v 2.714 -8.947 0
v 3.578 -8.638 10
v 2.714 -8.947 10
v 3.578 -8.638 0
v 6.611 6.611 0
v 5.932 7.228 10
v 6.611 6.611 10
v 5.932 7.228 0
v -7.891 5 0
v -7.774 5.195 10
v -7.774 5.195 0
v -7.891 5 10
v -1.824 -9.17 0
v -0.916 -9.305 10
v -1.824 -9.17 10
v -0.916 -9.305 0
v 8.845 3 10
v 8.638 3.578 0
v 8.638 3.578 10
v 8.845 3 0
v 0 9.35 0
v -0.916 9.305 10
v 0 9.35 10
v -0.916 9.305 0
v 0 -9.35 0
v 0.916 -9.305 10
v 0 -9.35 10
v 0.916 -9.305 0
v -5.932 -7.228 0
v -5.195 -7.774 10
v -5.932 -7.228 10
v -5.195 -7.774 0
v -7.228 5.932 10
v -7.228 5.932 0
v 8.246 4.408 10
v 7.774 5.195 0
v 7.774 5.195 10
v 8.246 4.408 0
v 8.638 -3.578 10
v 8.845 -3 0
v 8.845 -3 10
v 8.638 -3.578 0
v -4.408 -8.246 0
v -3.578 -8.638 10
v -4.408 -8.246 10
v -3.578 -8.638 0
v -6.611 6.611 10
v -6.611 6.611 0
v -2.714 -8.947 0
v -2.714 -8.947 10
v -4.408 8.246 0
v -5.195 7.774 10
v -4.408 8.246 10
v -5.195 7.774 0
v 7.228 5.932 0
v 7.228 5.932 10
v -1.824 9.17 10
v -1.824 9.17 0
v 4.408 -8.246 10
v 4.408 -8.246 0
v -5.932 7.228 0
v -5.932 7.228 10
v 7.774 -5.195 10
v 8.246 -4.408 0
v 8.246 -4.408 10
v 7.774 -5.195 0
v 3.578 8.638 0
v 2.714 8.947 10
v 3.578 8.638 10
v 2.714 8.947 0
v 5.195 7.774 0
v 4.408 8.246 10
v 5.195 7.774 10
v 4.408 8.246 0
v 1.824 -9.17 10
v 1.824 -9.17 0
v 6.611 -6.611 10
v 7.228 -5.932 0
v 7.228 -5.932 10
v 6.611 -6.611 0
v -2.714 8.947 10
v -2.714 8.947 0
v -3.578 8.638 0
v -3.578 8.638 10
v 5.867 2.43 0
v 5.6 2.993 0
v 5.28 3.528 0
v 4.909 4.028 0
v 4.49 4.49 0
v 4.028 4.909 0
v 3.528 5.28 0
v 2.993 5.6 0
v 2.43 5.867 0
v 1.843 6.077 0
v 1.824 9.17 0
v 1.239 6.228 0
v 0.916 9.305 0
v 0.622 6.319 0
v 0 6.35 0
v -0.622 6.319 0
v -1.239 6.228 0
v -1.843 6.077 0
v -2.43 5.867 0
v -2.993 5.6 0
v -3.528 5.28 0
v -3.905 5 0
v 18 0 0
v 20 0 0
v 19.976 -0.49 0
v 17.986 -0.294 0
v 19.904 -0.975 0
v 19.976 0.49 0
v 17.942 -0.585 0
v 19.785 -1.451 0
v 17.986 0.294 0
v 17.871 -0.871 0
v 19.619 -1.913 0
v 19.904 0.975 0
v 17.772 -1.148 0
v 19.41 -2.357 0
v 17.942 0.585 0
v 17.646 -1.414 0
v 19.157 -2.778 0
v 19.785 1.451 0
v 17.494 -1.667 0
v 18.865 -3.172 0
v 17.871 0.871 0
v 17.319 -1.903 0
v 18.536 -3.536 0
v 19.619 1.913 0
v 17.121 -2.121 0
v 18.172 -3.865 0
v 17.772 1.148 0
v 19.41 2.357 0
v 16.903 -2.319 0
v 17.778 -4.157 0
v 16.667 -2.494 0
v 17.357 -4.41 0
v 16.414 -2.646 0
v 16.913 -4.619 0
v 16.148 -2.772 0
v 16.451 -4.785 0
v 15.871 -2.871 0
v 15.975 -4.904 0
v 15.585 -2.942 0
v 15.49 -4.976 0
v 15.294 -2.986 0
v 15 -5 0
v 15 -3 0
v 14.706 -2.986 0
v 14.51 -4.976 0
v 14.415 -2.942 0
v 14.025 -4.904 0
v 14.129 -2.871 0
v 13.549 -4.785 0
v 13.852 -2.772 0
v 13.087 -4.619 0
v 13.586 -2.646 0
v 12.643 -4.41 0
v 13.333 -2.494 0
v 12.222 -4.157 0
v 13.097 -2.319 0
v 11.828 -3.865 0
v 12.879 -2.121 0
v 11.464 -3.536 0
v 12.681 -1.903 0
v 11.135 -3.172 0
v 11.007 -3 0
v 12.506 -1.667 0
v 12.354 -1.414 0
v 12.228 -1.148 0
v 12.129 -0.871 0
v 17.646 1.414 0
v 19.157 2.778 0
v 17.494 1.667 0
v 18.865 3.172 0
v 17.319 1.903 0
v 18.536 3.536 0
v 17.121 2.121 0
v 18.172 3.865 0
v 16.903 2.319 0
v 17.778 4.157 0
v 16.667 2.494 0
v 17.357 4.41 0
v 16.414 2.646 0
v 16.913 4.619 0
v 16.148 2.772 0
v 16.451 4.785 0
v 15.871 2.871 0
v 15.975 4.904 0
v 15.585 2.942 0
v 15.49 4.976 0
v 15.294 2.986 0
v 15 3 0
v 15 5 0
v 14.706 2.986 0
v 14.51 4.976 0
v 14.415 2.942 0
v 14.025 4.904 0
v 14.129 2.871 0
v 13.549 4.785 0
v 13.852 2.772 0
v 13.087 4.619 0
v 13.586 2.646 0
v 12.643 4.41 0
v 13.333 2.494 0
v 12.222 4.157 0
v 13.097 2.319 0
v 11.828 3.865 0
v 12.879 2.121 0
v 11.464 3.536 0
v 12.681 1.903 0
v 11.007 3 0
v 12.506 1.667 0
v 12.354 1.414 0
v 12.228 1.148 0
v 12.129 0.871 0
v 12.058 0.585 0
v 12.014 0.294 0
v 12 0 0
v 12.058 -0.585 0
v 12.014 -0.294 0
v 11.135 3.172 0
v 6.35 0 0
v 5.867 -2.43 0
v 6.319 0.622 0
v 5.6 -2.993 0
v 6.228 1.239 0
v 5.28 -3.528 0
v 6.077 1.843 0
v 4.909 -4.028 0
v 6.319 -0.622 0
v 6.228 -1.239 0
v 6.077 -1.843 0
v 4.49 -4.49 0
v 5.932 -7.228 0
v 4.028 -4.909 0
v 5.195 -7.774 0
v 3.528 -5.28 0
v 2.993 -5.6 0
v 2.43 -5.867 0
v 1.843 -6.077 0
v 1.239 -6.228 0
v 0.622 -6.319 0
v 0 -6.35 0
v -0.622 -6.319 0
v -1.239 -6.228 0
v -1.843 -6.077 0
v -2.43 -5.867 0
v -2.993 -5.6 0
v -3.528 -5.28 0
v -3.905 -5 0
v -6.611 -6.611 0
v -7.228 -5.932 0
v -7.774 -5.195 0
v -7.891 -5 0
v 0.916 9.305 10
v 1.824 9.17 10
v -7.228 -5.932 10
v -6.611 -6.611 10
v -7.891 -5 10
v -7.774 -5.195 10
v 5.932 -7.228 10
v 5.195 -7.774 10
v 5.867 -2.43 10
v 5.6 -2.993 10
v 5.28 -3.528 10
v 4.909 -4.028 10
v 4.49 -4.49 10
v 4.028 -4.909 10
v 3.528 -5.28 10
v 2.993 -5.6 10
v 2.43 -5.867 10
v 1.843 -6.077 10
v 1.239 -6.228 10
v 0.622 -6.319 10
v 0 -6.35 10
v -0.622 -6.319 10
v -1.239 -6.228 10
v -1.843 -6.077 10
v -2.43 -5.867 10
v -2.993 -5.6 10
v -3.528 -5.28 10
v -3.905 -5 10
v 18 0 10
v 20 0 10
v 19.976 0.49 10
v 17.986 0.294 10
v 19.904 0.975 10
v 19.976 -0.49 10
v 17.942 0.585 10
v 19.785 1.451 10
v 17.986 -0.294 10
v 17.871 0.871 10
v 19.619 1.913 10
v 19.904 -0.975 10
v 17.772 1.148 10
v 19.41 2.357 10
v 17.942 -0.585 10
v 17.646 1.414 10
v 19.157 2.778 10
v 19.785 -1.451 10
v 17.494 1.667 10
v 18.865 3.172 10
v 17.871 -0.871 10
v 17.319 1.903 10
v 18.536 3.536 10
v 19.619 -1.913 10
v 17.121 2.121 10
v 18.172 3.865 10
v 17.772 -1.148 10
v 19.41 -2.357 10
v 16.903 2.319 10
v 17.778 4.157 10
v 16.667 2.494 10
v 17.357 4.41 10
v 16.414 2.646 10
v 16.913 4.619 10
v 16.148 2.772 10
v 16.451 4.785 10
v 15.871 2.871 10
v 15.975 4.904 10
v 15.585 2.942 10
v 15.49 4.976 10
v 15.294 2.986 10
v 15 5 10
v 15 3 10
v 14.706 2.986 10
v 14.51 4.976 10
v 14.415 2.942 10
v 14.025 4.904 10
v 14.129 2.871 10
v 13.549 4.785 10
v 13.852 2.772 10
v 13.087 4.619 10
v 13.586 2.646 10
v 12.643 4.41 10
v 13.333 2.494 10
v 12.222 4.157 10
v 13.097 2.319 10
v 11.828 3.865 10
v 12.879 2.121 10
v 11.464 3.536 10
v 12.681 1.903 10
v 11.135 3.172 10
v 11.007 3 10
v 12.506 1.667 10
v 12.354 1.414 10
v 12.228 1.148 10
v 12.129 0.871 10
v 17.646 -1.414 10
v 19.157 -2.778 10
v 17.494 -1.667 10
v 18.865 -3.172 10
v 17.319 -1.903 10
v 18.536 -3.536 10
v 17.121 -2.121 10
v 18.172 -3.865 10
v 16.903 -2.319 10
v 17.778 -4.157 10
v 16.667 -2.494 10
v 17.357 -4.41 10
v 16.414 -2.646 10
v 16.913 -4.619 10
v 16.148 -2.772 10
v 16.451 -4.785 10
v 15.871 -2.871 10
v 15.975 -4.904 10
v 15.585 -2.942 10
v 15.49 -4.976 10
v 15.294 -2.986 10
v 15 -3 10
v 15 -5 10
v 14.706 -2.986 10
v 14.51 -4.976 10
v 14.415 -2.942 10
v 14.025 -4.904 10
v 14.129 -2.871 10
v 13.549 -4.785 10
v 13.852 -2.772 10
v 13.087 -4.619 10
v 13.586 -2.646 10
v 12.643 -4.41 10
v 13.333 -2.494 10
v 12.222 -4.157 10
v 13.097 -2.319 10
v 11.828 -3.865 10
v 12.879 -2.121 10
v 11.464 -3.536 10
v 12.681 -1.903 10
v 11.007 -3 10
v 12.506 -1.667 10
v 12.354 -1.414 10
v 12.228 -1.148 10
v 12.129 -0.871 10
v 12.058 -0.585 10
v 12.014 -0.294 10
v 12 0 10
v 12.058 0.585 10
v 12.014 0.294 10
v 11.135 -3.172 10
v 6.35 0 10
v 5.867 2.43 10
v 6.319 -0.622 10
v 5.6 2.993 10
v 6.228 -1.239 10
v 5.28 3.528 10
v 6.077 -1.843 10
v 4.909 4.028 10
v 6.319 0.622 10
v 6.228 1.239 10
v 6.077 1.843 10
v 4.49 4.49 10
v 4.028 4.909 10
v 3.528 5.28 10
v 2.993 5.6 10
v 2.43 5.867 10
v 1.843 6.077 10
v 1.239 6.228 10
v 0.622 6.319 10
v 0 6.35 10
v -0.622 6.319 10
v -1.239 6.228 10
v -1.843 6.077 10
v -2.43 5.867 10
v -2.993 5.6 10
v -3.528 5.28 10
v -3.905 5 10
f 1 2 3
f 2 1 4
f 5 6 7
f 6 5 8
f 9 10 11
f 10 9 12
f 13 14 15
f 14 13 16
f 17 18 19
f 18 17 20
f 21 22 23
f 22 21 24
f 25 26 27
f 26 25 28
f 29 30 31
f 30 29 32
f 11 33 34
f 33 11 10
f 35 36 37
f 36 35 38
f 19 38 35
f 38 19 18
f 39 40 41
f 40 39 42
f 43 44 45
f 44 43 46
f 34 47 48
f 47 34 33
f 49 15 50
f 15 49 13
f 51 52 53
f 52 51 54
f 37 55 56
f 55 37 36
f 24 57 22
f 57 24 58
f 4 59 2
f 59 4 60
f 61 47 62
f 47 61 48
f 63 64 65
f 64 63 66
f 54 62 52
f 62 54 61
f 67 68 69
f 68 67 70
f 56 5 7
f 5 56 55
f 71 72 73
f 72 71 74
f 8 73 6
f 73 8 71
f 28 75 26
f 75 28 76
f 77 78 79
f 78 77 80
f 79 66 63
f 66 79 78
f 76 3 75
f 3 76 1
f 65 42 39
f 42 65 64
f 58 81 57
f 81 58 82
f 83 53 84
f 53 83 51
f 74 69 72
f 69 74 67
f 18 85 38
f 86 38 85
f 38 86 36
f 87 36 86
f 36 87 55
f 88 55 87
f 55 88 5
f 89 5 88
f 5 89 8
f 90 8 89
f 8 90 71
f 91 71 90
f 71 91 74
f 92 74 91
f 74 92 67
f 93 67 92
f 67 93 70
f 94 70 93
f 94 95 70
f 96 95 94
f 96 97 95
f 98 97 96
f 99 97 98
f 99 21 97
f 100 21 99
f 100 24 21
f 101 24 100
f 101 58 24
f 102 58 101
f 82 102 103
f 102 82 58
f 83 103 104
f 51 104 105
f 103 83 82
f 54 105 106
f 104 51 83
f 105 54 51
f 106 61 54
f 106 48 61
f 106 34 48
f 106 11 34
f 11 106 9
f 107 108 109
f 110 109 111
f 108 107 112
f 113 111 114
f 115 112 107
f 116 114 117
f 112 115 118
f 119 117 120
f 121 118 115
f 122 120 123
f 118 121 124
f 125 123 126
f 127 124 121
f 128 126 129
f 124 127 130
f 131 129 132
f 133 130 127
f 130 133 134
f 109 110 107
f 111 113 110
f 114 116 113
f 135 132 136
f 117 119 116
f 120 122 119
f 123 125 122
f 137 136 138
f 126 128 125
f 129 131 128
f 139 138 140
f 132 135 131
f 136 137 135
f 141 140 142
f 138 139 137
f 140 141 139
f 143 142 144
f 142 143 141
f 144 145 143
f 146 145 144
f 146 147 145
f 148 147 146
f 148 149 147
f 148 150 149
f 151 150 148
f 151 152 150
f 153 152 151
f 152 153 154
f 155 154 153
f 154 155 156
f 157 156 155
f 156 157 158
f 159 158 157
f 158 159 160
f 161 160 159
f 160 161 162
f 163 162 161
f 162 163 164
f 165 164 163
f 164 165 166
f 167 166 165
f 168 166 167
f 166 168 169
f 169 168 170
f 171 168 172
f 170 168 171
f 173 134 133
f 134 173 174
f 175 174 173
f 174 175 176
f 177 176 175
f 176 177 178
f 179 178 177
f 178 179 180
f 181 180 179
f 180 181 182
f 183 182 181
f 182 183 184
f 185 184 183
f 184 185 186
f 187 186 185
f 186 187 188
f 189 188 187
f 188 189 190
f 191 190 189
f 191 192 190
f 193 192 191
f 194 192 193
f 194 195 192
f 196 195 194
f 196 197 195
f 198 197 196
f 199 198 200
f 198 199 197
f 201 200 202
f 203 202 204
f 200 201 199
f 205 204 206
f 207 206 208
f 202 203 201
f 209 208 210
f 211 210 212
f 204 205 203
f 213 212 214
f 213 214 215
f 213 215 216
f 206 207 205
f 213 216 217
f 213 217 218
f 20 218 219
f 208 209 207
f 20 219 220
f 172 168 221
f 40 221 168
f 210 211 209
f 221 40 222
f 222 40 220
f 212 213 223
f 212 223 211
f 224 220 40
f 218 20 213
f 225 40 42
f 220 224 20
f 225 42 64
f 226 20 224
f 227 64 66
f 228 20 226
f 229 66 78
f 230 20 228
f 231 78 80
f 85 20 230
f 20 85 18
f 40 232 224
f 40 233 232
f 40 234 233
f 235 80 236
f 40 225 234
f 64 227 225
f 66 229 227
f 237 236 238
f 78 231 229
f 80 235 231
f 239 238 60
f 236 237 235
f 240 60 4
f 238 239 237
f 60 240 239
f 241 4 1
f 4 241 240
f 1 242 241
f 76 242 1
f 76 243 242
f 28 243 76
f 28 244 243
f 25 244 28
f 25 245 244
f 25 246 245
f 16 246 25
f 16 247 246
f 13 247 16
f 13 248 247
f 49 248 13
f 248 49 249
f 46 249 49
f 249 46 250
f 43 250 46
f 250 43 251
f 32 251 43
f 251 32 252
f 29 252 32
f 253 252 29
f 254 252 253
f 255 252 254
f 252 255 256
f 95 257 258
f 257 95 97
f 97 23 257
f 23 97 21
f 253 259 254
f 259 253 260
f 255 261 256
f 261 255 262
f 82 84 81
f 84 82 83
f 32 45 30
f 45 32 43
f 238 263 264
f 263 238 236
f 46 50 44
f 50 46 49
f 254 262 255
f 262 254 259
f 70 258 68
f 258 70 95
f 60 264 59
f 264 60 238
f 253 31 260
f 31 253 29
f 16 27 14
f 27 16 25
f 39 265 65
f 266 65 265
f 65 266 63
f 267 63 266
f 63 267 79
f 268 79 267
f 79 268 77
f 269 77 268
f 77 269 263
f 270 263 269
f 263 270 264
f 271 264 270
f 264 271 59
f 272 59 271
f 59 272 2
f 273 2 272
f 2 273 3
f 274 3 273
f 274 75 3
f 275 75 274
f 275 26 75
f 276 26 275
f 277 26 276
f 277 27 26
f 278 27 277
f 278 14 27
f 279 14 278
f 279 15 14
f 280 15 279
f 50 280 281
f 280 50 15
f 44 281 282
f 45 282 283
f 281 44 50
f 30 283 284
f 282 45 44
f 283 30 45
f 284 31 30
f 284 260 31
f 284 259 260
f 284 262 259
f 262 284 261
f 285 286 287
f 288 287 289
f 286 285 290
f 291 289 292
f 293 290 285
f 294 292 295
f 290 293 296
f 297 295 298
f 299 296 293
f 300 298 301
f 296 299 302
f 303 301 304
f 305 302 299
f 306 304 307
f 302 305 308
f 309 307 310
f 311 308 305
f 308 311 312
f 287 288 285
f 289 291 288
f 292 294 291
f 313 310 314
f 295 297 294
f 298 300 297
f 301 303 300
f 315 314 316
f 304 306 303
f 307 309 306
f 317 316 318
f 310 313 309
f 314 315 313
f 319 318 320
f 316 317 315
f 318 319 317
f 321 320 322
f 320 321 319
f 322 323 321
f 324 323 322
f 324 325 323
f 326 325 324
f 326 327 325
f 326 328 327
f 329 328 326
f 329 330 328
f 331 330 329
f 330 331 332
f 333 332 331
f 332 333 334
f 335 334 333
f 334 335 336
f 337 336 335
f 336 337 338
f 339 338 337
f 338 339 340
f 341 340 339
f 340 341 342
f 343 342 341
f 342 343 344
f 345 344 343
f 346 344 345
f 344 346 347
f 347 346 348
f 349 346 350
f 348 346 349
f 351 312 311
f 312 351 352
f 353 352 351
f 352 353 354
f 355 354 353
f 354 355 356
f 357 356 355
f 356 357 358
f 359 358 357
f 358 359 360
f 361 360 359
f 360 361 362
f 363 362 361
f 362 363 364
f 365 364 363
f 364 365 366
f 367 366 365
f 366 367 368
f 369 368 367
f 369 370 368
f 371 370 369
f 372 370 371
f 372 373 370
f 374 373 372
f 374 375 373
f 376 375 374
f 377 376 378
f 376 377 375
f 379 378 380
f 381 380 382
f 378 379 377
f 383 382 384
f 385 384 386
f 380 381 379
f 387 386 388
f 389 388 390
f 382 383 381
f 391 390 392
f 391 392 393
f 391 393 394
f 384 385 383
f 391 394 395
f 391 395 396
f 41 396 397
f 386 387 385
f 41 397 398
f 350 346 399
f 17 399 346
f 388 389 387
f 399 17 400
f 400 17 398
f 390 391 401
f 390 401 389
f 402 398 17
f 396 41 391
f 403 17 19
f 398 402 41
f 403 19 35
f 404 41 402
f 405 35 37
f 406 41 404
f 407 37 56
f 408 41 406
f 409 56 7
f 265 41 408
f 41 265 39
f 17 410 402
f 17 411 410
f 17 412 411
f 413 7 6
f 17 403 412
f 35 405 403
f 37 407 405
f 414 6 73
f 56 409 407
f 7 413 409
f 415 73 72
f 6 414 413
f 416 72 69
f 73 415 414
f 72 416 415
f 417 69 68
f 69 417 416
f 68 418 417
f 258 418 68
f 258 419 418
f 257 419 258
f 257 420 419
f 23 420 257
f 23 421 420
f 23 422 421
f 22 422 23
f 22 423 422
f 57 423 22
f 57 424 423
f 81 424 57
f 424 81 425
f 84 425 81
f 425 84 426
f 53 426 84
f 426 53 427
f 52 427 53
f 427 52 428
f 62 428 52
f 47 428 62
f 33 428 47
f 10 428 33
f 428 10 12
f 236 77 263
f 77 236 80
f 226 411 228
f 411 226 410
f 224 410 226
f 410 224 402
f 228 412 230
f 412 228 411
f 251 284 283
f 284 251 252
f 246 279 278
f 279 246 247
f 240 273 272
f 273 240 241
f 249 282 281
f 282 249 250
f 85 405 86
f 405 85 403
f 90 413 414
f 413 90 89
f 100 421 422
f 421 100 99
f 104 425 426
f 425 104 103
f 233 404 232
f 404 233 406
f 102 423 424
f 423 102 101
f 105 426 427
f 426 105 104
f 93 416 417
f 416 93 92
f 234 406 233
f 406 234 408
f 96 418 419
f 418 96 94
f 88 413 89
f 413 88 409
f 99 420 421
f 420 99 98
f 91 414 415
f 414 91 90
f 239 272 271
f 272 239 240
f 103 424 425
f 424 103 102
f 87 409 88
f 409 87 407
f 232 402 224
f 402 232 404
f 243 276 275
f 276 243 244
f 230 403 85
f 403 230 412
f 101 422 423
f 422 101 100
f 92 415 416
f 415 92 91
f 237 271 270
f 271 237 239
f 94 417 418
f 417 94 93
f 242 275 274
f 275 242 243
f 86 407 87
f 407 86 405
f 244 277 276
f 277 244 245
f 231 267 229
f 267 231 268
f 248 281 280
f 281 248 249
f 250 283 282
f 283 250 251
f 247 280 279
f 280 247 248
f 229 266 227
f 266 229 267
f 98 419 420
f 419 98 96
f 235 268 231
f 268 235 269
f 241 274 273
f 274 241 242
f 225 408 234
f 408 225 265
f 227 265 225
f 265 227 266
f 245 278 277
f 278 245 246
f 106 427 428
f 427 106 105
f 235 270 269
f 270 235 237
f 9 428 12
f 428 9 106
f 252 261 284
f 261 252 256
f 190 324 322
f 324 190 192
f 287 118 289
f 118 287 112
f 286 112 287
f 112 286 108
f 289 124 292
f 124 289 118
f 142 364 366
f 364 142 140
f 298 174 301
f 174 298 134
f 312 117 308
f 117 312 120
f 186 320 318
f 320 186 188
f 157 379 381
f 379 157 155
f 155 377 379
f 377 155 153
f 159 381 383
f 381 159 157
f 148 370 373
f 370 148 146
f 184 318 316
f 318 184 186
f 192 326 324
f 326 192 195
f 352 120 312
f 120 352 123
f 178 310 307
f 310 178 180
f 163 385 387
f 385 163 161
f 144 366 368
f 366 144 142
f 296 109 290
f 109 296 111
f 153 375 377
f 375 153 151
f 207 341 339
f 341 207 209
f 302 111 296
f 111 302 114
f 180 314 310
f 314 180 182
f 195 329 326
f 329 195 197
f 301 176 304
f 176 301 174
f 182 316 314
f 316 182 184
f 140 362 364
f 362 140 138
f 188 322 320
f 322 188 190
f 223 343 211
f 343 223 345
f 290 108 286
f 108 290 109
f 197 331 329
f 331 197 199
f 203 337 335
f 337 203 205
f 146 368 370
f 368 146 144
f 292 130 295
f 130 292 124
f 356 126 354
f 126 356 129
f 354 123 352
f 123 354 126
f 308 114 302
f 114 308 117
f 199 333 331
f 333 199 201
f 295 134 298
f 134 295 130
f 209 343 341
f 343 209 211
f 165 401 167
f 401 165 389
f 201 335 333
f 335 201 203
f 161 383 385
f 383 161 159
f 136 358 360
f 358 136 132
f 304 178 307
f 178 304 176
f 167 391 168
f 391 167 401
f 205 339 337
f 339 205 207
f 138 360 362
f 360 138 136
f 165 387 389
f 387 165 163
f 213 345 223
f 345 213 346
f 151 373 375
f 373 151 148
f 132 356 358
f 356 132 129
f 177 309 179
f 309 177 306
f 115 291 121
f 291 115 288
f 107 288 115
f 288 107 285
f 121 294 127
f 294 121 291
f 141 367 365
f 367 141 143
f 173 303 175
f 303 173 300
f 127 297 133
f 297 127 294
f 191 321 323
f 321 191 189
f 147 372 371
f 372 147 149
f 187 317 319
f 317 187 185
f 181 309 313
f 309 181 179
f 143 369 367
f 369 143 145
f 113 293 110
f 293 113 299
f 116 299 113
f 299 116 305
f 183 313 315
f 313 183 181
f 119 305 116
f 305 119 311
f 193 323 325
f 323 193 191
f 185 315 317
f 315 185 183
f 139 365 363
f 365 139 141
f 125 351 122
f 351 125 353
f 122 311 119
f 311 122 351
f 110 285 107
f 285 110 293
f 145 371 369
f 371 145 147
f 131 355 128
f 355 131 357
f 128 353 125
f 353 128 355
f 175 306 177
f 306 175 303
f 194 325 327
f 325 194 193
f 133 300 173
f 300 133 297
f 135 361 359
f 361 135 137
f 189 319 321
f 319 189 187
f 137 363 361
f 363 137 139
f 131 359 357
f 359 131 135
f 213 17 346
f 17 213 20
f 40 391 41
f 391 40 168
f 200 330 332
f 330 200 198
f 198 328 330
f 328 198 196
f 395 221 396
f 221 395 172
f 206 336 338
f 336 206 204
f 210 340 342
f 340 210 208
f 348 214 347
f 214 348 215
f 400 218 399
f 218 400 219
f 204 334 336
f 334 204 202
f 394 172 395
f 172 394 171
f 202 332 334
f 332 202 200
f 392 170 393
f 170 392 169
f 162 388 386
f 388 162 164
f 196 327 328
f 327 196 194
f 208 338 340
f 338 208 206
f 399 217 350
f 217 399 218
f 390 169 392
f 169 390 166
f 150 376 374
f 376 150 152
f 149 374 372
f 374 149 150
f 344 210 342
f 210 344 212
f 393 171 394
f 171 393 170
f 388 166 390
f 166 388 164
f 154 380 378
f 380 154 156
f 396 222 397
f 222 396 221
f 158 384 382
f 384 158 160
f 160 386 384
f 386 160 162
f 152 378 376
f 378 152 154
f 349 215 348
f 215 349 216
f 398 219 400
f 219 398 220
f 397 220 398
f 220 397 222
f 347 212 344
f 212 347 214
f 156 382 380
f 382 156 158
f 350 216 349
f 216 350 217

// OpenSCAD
// Snap-on clip for lab stand rod and tubing.
// Printed flat: 10 mm tall extrusion (Z) of a 2-D profile in the XY plane.
// Orientation: Rests on XY plane at z=0, builds upward. Centred on origin.

// Dimensions
rod_id   = 12.7;   // Rod inner diameter
rod_wall = 3;      // Rod ring wall thickness
rod_od   = rod_id + 2 * rod_wall; // Rod outer diameter (18.7)
rod_cut  = 10;     // Width of opening in rod ring (-X side)

tube_id  = 6;      // Tubing inner diameter
tube_wall = 2;     // Tubing ring wall thickness
tube_od  = tube_id + 2 * tube_wall; // Tubing outer diameter (10)
tube_x   = 15;     // Center X of tubing ring
tube_cut = 4.5;    // Width of opening in tubing ring (+X side)

bridge_w = 6;      // Width of bridge in Y
bridge_x1 = 8;     // Start X of bridge
bridge_x2 = 12;    // End X of bridge

height   = 10;     // Extrusion height (Z)

$fn = 64;

// Build the solid profile in the XY plane, then extrude along Z.
// The profile is constructed by uniting the outer boundaries and subtracting the voids.

difference() {
    // 1. Create the solid outer shape by uniting the three main components:
    //    - Rod Ring (C-shape)
    //    - Tubing Ring (C-shape)
    //    - Bridge (Rectangle)
    
    union() {
        // Rod Ring: OD 18.7, centered at (0,0). Opening on -X side (x<0, |y|<5).
        // We create a C-shape by taking a full circle and subtracting a rectangle.
        // To ensure the cutout is deep enough, we subtract a rectangle slightly larger than the cutout dimensions.
        translate([0, 0]) {
            cylinder(h = height, d = rod_od);
            // Subtract the void inside the rod ring
            translate([0, 0]) cylinder(h = height + 0.1, d = rod_id);
            // Subtract the opening on the -X side
            translate([-rod_od/2, -rod_cut/2]) cube([rod_cut + 0.1, rod_cut, height + 0.1]);
        }
        
        // Tubing Ring: OD 10, centered at (15,0). Opening on +X side (x>15, |y|<2.25).
        translate([tube_x, 0]) {
            cylinder(h = height, d = tube_od);
            // Subtract the void inside the tubing ring
            translate([0, 0]) cylinder(h = height + 0.1, d = tube_id);
            // Subtract the opening on the +X side
            translate([tube_od/2, -tube_cut/2]) cube([tube_cut + 0.1, tube_cut, height + 0.1]);
        }
        
        // Bridge: Rectangle from x=8 to x=12, y=-3 to y=3 (width 6).
        // Positioned to connect the two rings.
        translate([bridge_x1, -bridge_w/2]) cube([bridge_x2 - bridge_x1, bridge_w, height]);
    }
    
    // 2. Subtract the internal voids (holes) to ensure clean internal surfaces.
    // Rod Inner Hole
    translate([0, 0]) cylinder(h = height + 0.1, d = rod_id);
    
    // Tubing Inner Hole
    translate([tube_x, 0]) cylinder(h = height + 0.1, d = tube_id);
    
    // Rod Cutout Void (ensure it's fully removed)
    translate([-rod_od/2, -rod_cut/2]) cube([rod_cut + 0.1, rod_cut, height + 0.1]);
    
    // Tubing Cutout Void (ensure it's fully removed)
    translate([tube_x + tube_od/2, -tube_cut/2]) cube([tube_cut + 0.1, tube_cut, height + 0.1]);
}
